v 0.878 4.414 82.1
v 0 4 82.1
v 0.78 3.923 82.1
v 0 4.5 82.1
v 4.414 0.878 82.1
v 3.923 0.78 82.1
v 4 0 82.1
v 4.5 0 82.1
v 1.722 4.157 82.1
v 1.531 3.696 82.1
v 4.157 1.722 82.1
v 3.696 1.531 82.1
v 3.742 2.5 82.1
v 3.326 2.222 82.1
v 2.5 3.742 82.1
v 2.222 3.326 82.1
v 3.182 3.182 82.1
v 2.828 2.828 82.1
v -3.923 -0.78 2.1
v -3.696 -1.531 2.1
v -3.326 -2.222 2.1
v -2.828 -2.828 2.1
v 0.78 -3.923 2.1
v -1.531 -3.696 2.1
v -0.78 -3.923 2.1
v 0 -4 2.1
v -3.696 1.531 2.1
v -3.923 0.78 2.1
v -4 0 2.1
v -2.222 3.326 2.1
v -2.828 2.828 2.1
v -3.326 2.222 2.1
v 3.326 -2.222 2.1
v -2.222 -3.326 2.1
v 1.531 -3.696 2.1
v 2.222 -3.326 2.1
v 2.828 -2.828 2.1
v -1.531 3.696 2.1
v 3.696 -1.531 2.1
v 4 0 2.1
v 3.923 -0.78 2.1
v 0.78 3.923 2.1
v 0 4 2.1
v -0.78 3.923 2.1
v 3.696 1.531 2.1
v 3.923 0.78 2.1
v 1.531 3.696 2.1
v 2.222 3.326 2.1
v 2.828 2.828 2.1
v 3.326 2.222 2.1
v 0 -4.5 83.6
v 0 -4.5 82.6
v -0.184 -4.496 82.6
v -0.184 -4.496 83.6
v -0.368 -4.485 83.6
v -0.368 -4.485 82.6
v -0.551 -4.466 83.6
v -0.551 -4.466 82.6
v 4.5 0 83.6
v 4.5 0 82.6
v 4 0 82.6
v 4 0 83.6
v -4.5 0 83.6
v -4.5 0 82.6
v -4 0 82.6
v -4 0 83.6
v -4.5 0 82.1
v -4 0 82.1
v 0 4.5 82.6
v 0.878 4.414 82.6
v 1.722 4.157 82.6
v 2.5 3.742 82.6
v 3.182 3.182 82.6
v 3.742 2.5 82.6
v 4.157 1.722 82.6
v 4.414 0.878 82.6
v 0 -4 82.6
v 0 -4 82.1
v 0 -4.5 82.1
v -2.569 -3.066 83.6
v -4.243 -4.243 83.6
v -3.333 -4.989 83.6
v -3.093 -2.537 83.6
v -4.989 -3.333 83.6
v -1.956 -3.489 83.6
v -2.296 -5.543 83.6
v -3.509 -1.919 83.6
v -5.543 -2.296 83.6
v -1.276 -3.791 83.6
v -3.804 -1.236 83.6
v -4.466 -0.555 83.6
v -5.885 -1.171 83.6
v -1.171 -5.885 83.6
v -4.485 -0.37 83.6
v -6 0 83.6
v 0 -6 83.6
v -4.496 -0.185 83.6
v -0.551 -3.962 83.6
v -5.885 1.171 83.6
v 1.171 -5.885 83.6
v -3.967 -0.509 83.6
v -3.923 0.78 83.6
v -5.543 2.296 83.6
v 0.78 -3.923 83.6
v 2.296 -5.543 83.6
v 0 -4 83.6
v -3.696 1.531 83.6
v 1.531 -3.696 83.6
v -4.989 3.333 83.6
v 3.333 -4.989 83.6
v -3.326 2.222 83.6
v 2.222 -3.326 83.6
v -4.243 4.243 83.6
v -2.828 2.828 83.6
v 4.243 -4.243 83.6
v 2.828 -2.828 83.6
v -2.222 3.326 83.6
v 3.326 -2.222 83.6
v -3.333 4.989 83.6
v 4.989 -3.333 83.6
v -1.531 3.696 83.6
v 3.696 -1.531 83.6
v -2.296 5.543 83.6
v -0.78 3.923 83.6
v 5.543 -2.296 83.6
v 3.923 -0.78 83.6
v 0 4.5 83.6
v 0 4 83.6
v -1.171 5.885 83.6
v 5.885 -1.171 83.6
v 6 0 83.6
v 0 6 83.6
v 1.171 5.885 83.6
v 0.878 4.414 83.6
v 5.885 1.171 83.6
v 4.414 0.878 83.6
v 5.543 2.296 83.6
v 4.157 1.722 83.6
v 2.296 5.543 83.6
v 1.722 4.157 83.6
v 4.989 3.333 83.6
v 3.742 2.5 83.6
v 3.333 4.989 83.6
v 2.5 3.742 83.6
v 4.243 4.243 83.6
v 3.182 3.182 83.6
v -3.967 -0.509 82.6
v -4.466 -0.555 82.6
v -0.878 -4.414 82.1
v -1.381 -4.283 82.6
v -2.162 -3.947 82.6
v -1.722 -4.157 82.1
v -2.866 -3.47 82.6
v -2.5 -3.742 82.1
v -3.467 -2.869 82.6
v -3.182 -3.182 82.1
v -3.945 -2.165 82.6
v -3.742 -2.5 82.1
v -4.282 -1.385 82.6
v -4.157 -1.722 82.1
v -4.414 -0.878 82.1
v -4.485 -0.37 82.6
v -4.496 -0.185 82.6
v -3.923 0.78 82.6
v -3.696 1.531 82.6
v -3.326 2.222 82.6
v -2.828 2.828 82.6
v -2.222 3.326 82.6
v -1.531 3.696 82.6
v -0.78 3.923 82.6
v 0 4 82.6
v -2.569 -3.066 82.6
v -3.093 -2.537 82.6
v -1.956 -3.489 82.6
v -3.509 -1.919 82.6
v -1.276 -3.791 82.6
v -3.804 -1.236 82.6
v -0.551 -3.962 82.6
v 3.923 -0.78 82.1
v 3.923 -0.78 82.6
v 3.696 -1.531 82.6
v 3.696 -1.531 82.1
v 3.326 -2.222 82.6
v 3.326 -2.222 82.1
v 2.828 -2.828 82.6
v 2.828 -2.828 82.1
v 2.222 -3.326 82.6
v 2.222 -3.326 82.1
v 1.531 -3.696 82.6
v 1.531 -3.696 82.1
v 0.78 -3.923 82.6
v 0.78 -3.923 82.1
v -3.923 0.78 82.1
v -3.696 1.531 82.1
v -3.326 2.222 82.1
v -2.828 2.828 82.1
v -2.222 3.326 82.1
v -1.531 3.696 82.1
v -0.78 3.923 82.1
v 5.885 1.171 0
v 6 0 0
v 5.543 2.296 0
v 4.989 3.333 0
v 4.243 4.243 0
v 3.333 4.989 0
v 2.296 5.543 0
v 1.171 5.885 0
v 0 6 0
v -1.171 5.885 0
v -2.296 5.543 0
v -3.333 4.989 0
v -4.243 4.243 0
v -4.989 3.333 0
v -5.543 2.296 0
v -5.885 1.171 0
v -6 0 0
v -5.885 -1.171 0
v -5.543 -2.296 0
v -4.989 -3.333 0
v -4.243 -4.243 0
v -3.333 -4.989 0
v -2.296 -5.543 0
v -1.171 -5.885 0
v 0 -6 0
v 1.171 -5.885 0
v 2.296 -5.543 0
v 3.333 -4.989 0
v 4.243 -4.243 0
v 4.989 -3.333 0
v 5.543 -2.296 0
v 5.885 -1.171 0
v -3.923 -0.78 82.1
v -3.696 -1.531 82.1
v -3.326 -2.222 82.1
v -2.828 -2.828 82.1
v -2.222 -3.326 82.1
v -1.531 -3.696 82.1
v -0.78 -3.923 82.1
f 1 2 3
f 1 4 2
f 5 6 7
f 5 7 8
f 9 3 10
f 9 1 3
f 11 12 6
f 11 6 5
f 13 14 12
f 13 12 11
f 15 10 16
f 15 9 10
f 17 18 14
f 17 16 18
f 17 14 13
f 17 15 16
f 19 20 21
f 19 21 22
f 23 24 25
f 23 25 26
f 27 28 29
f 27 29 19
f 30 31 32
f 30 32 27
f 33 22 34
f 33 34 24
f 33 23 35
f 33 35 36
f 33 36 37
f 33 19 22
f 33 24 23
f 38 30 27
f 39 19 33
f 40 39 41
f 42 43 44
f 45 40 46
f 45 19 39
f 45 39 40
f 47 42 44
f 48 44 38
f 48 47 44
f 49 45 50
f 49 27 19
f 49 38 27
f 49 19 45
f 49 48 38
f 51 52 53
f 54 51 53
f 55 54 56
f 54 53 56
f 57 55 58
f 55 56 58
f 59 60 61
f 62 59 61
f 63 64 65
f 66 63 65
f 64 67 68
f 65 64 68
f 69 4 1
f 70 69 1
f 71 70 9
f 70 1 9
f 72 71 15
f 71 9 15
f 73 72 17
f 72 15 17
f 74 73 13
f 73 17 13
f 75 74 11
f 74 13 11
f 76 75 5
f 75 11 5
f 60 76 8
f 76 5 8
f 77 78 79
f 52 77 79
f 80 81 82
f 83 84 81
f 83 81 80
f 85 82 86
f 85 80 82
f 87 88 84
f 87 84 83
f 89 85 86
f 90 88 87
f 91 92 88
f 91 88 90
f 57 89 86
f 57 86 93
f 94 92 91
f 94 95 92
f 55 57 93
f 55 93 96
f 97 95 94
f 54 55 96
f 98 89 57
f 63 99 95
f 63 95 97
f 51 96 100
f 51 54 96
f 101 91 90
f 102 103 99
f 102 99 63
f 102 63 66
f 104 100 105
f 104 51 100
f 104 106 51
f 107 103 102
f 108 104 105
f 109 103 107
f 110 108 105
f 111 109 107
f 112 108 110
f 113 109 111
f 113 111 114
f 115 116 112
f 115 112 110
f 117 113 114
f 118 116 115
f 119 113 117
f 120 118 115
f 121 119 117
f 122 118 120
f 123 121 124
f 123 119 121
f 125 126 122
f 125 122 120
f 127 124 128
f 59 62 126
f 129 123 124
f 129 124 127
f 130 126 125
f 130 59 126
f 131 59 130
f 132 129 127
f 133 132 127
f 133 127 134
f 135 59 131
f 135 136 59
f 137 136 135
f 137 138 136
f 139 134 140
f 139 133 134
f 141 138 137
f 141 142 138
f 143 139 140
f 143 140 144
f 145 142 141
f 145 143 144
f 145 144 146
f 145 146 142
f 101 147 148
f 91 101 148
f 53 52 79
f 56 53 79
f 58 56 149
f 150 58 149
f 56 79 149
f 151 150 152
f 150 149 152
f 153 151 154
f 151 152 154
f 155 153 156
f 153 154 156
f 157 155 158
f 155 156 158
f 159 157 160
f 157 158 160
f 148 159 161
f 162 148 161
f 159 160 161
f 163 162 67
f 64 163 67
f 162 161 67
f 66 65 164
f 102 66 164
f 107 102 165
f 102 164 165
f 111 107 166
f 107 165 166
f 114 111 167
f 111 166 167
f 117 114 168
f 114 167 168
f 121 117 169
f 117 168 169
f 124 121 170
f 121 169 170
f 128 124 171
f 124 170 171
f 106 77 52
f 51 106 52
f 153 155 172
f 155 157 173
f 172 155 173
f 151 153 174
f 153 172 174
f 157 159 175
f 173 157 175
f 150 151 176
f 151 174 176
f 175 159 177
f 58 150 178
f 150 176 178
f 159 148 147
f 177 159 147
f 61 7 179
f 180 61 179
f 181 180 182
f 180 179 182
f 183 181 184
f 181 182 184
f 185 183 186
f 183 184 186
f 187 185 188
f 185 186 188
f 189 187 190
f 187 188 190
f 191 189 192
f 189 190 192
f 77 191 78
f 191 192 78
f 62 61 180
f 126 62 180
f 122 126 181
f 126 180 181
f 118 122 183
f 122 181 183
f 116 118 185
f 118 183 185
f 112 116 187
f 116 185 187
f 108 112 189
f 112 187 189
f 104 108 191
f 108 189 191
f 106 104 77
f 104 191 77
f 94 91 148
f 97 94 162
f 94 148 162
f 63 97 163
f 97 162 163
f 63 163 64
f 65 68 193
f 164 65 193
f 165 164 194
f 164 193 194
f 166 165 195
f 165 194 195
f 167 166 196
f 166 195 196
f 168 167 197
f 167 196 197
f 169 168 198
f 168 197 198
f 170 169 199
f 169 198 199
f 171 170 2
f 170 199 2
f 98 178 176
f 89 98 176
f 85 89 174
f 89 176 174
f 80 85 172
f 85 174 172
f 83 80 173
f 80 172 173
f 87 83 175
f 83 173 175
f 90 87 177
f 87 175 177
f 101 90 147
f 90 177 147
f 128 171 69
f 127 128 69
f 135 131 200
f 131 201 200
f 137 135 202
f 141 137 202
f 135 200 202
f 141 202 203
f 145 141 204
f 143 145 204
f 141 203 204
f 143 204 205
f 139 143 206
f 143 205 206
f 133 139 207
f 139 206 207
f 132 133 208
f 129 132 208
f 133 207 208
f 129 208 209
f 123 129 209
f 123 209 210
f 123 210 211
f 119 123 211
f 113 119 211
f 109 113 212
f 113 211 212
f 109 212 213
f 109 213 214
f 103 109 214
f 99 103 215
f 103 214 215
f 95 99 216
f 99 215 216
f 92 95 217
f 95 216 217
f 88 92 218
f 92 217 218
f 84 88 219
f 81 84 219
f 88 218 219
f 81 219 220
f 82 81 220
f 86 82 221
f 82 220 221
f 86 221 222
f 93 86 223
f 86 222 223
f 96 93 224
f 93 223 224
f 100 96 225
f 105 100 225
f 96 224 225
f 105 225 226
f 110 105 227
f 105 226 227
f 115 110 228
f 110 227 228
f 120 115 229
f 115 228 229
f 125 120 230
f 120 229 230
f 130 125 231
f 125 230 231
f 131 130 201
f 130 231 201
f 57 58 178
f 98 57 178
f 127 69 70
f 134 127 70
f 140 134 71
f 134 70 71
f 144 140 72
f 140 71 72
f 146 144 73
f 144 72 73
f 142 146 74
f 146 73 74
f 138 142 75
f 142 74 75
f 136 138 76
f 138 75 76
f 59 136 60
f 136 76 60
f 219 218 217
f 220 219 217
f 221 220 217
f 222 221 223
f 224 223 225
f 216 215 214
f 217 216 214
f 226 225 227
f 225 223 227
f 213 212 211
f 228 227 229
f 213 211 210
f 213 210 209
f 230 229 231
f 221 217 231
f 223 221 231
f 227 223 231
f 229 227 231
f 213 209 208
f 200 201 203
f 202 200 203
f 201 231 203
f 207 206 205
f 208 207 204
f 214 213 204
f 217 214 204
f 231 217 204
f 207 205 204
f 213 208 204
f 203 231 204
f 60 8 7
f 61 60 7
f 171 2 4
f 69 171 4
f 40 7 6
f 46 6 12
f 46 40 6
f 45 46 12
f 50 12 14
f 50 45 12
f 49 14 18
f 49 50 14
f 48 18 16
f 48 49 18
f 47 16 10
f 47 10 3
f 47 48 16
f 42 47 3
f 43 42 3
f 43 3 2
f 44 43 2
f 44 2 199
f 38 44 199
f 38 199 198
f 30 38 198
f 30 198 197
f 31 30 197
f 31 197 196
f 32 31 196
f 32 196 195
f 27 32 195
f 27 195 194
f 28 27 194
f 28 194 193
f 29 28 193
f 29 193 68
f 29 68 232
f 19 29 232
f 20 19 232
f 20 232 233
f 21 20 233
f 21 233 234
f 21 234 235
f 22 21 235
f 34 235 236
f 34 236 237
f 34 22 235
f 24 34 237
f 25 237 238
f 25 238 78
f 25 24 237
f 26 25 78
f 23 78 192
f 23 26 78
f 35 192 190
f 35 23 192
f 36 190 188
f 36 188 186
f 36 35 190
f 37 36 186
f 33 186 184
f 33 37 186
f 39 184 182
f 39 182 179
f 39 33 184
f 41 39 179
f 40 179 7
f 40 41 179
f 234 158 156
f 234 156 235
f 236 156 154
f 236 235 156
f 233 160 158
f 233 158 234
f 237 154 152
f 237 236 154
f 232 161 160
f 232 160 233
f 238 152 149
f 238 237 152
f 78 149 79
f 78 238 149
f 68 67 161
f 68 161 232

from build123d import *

# Parameters (mm, degrees)
F0_R     = 6
F1_DEPTH = 2.1
F2_R     = 6
F2_R_2   = 4
F3_DEPTH = 80
F4_R     = 6
F5_DEPTH = 0.5
F6_R     = 6
F7_DEPTH = 1


# Not quite as in the source:
# - after a boolean that leaves OpenCascade's solid faulty, fix() repairs it


with BuildPart() as f1:
    # F0 (on Top) → F1 (new body)
    with BuildSketch(Plane.XY):
        Circle(F0_R)
    extrude(amount=F1_DEPTH)

    # F2 (on face) → F3 (join)
    with BuildSketch(Plane.XY.offset(2.1)):
        Circle(F2_R)
        Circle(F2_R_2, mode=Mode.SUBTRACT)
    extrude(amount=F3_DEPTH)

    # F4 (on face) → F5 (join)
    with BuildSketch(Plane.XY.offset(82.1)):
        Circle(F4_R)
        with BuildLine():
            Line((0, 4), (0, 4.5))
            ThreePointArc((0, 4.5), (3.1819805153, 3.1819805153), (4.5, 0))
            Line((4.5, 0), (4, 0))
            ThreePointArc((4, 0), (2.8284271247, -2.8284271247), (0, -4))
            Line((0, -4), (0, -4.5))
            ThreePointArc((0, -4.5), (-3.1819805153, -3.1819805153), (-4.5, 0))
            Line((-4.5, 0), (-4, 0))
            ThreePointArc((-4, 0), (-2.8284271247, 2.8284271247), (0, 4))
        make_face(mode=Mode.SUBTRACT)
    extrude(amount=F5_DEPTH)

    add(f1.part.fix(), mode=Mode.REPLACE)

    # F6 (on face) → F7 (join)
    with BuildSketch(Plane.XY.offset(82.6)):
        Circle(F6_R)
        with BuildLine():
            ThreePointArc((-4, 0), (-2.8284271247, 2.8284271247), (0, 4))
            Line((0, 4), (0, 4.5))
            ThreePointArc((0, 4.5), (3.1819805153, 3.1819805153), (4.5, 0))
            Line((4.5, 0), (4, 0))
            ThreePointArc((4, 0), (2.8284271247, -2.8284271247), (0, -4))
            Line((0, -4), (0, -4.5))
            ThreePointArc((0, -4.5), (-0.2759966411, -4.4915282315), (-0.5509540913, -4.466144824))
            ThreePointArc((-0.5509540913, -4.466144824), (-3.1806256543, -3.1833347997), (-4.4656741218, -0.554756377))
            ThreePointArc((-4.4656741218, -0.554756377), (-4.4914103324, -0.2779086647), (-4.5, 0))
            Line((-4.5, 0), (-4, 0))
        make_face(mode=Mode.SUBTRACT)
        with BuildLine():
            ThreePointArc((-0.5509540913, -3.9618745045), (-2.8432495074, -2.813526655), (-3.9674454323, -0.5092904299))
            Line((-3.9674454323, -0.5092904299), (-4.4656741218, -0.554756377))
            ThreePointArc((-4.4656741218, -0.554756377), (-3.1806256543, -3.1833347997), (-0.5509540913, -4.466144824))
            Line((-0.5509540913, -4.466144824), (-0.5509540913, -3.9618745045))
        make_face()
    extrude(amount=F7_DEPTH)


solid = f1.part
